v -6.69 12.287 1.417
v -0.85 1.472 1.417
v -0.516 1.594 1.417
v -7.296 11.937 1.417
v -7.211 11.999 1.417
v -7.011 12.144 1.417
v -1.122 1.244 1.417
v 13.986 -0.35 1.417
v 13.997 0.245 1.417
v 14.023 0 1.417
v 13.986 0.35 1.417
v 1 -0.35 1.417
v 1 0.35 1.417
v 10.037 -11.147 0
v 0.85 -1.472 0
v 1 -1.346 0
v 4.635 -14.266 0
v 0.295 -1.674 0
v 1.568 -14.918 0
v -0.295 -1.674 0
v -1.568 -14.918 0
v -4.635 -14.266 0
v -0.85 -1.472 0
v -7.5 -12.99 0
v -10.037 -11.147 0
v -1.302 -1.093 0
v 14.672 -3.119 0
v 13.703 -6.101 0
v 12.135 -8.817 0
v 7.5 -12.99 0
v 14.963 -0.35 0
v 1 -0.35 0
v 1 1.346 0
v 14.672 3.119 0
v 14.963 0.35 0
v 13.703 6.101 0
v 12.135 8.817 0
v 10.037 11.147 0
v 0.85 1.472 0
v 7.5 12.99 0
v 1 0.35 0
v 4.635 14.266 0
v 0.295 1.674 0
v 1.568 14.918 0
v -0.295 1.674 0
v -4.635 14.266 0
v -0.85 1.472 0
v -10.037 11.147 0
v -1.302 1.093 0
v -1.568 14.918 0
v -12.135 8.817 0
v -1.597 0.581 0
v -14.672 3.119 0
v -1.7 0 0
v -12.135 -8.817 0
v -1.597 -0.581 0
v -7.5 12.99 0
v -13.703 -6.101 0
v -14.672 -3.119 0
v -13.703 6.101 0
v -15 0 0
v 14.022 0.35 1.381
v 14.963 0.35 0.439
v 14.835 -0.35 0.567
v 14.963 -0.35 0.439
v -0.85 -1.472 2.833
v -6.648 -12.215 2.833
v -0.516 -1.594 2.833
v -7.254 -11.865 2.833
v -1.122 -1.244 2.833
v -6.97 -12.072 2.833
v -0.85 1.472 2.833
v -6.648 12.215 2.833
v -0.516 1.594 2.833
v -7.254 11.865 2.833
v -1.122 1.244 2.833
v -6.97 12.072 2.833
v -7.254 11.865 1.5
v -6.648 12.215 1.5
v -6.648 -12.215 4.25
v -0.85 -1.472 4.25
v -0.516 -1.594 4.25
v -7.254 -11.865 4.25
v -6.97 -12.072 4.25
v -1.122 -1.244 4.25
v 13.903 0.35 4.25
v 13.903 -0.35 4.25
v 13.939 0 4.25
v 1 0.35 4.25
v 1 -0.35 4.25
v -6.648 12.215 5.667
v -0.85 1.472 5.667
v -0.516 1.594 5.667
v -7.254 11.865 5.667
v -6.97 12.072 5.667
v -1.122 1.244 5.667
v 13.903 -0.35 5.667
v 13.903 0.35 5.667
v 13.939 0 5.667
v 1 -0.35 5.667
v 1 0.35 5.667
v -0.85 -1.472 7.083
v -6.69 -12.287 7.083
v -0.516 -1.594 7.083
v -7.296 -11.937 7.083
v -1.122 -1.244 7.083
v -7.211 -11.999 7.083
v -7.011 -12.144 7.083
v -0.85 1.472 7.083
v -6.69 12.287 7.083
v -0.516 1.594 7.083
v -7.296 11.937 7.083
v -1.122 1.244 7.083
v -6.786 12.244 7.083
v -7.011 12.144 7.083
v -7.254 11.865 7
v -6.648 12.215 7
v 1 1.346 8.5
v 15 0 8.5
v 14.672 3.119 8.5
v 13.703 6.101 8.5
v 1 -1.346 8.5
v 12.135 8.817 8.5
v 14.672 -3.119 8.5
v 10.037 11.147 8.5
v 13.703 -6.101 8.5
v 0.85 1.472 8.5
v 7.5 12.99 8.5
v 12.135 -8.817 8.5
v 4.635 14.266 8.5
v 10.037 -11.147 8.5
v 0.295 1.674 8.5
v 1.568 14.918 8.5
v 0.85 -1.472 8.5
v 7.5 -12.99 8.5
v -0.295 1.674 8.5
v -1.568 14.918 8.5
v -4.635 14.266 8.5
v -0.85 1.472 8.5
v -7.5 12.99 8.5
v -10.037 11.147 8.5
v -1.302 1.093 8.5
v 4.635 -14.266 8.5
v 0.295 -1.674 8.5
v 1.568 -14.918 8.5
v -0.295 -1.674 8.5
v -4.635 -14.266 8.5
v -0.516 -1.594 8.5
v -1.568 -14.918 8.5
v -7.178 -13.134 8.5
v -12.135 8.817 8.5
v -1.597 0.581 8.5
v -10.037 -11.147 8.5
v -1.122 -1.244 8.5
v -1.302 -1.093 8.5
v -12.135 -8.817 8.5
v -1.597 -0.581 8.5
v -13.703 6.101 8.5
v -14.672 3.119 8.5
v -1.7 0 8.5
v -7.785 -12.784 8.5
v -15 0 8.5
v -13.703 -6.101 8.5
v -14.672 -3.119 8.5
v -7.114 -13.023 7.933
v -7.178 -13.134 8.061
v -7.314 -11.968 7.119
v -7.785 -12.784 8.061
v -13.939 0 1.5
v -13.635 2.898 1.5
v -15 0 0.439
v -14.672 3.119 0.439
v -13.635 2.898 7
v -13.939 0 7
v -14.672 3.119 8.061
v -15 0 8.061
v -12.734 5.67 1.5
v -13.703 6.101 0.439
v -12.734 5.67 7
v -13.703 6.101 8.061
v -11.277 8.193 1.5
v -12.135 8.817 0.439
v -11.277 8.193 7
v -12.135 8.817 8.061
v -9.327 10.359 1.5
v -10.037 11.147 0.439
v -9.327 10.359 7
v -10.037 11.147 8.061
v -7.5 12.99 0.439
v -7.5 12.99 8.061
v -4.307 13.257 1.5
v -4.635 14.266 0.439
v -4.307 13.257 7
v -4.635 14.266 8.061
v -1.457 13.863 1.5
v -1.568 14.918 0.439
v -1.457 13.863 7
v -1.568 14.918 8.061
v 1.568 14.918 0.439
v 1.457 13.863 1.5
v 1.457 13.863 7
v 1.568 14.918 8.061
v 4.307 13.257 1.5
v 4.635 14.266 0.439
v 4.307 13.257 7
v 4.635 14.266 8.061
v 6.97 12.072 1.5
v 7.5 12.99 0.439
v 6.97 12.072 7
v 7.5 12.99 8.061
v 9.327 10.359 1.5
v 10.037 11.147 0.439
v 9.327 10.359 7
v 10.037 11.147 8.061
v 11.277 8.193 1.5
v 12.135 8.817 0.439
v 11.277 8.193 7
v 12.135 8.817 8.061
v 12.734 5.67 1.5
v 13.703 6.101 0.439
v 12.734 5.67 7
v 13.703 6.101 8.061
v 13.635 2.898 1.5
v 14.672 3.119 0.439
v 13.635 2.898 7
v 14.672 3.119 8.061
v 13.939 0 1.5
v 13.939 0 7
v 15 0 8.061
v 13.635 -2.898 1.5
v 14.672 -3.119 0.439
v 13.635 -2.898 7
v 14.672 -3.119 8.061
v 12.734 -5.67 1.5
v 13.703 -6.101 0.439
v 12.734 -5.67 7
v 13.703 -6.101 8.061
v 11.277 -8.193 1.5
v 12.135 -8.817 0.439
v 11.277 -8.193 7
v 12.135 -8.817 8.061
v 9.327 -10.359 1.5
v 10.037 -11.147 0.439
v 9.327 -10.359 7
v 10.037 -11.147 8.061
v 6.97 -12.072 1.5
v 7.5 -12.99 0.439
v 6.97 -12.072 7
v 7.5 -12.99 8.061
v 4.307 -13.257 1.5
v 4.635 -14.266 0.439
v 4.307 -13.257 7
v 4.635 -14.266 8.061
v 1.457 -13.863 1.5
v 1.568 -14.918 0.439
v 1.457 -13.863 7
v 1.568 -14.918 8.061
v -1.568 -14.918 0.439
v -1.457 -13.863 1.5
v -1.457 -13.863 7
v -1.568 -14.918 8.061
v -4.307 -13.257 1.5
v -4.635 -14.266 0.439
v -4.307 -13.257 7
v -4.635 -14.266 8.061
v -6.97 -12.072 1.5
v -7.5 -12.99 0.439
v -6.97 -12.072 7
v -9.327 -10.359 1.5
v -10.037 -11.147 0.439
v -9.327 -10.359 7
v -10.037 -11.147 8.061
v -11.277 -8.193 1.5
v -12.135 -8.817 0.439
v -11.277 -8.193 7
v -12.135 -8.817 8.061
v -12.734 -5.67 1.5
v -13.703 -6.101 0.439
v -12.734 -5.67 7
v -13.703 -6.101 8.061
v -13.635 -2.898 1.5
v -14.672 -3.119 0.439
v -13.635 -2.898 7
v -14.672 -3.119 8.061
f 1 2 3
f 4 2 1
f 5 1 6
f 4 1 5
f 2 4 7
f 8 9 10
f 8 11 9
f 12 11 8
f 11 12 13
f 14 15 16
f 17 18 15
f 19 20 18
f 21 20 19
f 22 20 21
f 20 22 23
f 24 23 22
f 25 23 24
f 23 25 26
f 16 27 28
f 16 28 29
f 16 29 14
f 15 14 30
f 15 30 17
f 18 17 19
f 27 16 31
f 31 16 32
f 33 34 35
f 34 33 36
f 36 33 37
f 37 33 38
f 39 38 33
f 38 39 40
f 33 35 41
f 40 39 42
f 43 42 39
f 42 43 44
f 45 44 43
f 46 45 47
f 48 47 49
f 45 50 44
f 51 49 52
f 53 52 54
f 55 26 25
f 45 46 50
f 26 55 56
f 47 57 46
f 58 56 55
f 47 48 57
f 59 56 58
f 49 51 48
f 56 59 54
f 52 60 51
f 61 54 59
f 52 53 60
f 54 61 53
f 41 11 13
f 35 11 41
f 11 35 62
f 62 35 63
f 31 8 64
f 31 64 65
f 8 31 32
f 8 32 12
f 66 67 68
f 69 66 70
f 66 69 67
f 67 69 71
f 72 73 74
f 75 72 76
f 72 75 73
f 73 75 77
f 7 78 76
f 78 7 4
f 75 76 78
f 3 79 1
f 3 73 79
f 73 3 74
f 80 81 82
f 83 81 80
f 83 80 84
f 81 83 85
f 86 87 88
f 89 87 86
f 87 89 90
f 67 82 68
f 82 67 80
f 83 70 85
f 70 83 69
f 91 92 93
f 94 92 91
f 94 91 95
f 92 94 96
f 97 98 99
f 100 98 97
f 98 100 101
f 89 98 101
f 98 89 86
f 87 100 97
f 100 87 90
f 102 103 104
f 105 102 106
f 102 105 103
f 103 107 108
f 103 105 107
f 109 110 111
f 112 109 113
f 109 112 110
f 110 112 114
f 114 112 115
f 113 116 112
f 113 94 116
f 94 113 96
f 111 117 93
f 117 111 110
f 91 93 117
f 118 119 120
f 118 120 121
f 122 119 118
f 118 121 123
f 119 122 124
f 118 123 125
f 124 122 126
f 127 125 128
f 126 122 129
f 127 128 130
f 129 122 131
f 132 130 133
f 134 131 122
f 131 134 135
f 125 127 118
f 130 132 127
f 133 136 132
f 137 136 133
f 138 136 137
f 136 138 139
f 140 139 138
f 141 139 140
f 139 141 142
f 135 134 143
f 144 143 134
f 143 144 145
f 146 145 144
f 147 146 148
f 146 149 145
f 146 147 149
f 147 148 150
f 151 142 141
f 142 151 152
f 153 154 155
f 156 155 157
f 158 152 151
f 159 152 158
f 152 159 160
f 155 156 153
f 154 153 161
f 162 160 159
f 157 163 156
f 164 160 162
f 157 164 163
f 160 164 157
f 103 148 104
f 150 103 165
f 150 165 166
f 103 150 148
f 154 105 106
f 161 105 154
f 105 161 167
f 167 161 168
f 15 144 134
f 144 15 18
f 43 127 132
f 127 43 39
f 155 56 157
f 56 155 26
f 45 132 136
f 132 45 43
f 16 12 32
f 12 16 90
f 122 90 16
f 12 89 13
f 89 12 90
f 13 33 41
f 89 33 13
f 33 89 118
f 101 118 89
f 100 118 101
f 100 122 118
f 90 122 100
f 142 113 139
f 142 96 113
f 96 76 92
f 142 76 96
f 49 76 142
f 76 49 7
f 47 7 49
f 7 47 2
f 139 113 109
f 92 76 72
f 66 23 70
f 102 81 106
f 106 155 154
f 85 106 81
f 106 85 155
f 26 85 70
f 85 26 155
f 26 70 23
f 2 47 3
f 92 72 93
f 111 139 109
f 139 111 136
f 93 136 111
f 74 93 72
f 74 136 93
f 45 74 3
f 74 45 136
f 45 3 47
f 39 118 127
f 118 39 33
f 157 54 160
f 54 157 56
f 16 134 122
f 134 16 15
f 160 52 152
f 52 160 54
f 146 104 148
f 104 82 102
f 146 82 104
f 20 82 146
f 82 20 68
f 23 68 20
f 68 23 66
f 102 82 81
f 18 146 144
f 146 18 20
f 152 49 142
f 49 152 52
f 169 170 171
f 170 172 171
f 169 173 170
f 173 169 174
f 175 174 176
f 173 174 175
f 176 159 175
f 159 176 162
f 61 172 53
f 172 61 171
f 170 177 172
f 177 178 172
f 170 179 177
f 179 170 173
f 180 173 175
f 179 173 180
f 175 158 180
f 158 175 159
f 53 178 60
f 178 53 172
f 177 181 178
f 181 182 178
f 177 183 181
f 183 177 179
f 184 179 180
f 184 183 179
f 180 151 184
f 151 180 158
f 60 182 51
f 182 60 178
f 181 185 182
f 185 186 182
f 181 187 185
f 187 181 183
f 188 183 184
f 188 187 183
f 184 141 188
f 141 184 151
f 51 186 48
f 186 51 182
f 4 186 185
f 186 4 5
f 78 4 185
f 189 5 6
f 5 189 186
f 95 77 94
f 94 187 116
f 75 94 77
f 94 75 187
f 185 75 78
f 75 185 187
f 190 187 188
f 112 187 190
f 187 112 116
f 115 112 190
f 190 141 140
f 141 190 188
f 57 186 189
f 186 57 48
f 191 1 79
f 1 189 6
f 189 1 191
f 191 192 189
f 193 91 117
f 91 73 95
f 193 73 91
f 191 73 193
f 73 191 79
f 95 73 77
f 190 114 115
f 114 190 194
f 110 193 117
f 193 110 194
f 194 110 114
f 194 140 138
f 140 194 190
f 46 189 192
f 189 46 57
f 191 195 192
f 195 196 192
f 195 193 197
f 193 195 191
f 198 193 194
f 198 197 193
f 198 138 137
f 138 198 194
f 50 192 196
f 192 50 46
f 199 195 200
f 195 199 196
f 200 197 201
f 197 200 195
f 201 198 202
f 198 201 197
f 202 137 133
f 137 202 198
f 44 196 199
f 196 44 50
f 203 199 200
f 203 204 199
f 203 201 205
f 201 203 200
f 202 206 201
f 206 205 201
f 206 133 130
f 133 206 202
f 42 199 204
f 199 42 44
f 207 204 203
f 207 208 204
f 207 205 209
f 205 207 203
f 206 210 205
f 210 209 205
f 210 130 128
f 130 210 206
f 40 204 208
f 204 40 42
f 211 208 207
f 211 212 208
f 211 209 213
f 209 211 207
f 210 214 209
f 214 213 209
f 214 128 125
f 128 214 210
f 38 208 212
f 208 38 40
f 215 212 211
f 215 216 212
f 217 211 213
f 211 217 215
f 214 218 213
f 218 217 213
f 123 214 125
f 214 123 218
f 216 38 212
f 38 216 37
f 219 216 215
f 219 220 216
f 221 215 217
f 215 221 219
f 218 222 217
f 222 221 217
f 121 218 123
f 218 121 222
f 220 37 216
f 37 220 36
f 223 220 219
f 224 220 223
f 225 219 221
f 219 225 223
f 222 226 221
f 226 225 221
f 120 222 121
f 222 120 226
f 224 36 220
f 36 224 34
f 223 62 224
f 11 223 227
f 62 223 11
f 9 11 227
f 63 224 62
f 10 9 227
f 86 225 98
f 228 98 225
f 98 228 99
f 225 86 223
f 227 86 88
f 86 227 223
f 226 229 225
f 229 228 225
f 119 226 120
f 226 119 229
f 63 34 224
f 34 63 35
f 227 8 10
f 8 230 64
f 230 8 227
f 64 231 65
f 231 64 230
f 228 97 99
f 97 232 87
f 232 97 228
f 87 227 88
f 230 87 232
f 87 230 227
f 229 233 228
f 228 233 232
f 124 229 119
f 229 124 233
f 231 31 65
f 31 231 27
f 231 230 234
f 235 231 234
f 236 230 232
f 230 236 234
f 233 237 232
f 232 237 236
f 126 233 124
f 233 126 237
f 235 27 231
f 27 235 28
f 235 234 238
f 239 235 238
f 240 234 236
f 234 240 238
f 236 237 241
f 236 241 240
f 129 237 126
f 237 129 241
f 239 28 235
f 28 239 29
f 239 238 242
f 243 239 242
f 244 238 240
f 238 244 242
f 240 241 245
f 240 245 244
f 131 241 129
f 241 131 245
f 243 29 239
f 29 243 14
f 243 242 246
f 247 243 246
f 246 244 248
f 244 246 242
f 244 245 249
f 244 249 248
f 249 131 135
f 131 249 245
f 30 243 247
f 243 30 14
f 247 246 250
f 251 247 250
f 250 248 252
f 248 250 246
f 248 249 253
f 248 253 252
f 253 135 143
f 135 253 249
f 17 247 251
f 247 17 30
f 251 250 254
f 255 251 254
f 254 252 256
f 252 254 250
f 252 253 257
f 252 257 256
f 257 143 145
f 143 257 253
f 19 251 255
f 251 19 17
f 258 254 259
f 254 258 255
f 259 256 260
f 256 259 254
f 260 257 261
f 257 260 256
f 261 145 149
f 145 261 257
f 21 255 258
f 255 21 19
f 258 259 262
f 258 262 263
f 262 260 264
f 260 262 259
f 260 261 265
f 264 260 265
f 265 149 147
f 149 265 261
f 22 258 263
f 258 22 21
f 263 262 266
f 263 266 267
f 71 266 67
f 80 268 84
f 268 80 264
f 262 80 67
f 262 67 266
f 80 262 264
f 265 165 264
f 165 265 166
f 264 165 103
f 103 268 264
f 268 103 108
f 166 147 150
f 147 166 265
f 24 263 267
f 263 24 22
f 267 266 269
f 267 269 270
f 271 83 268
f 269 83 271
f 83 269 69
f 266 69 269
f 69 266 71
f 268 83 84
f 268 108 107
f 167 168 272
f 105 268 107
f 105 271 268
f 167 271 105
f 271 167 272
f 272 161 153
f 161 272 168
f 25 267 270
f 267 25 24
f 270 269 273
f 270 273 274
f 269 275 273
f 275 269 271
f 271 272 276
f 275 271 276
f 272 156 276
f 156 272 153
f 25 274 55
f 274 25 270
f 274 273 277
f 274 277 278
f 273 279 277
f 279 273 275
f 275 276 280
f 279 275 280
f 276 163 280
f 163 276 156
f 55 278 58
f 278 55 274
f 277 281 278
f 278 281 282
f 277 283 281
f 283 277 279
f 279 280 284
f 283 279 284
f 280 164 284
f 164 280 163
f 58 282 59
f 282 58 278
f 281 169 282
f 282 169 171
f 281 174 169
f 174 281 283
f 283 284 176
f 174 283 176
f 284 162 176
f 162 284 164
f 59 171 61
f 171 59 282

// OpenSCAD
// file: inc/bevel_lib.scad
// Bevelled boxes, etc
module roundedbox(size=[1.0, 1.0, 1.0, ], radius = 0.1) {
    hull() {
        for (x = [radius, size[0] - radius]) {
            for (y = [radius, size[1] - radius]) {
                for (z = [radius, size[2] - radius]) {
                    translate([x,y,z])
                        sphere(r=radius);
                }
            }
        }
    }
}

module rounded_square_centered(size=[1,1], radius=0.1) {
    hull() {
        for (x = [- size[0] / 2 + radius, size[0] / 2 - radius]) {
            for (y = [- size[1] / 2 + radius, size[1] / 2 - radius]) {
                translate([x,y]) circle(radius);
            }
        }
    }
}

// Bevelled in x and y axes.
module bevelledbox(size=[1,1,1], radius=0.1) {
    linear_extrude(height=size[2]) {
        // 8-sided polygon
        polygon(points=[
            // Left
            [0, radius ],
            [0, size[1] - radius ],
            // Top
            [radius, size[1]],
            [size[0] - radius, size[1]],
            // Right
            [size[0], size[1] - radius],
            [size[0], radius],
            // Bot
            [size[0] -radius, 0],
            [radius, 0]
            ]);
    }
}

module bevelledbox_y(size=[1,1,1], radius=0.1) {
    // Bevelled around y
    translate([0,0,size[2]])
        rotate(-90, [1,0,0])
            bevelledbox([size[0], size[2], size[1]], radius); 
}

module bevelledbox_x(size=[1,1,1], radius=0.1) {
    // Bevelled around x
    translate([size[0],0,0])
        rotate(-90, [0,1,0])
            bevelledbox([size[2], size[1], size[0]], radius); 
}

// Draw origin-centred, unit polyhedron.
module octahedron(C0=1.0) {
    polyhedron(points = [
        [0.0, 0.0,  C0],
        [0.0, 0.0, -C0],
        [ C0, 0.0, 0.0],
        [-C0, 0.0, 0.0],
        [0.0,  C0, 0.0],
        [0.0, -C0, 0.0]
        ],
        faces = [
[ 4 , 2, 0],
[ 3 , 4, 0],
[ 5 , 3, 0],
[ 2 , 5, 0],
[ 5 , 2, 1],
[ 3 , 5, 1],
[ 4 , 3, 1],
[ 2 , 4, 1]
        ]
    );
}

module fullybevelledbox(size=[1,1,1], radius=0.1) {
    hull() {
        for (x = [radius, size[0] - radius]) {
            for (y = [radius, size[1] - radius]) {
                for (z = [radius, size[2] - radius]) {
                    translate([x,y,z])
                        octahedron(radius);
                }
            }
        }
    }
}
// main file
// This document uses MILLIMETRES as a unit.

// Set $fs (smallest arc fragment) to lower value than default 2.0
$fs = 0.6; // millimetres

use <inc/bevel_lib.scad>;

// Gearbox is approx 15x10 mm, so needs about 18mm inside
main_diameter = 30;

main_radius = main_diameter / 2;

axle_diameter = 3.0;
axle_radius = axle_diameter / 2;
axle_radius_margin = 0.2; // Extra allowance for shrinkage etc
main_height = 8.5;
tyre_radius = 1.5;
tyre_offset = 2.5; // tyre distance from end

// Unit-diamond 
module diamond(r=1.0)
{
    polygon(points=[ [r,0], [0,r], [-r,0], [0,-r] ]);
}

module bevel_square(size=[10,10], r=1.0)
{
    hull() {
        translate([r,r]) diamond(r);
        translate(size - [r,r]) diamond(r);
        translate([size[0] - r, r]) diamond(r);
        translate([r, size[1] - r]) diamond(r);
    }
}

module wheel_vase() 
{
    difference()
    {
        union()
        {
            // Outer part
            rotate_extrude(convexity=3) {
                difference() {
                    
                    union() {
                        // Walls
                            square([main_radius, main_height]);
                    };
                    // Tyre cutout
                    translate([main_radius - (tyre_radius / sqrt(2)),0])
                    {
                        bevel_square([tyre_radius * 2, main_height],
                            r=tyre_radius);
                    }
                }
            }
        }
        
        // Cutouts
        union() 
        {
            // Cutout for axle
            translate([0,0,-10]) {
                linear_extrude(height=30.0, convexity=3) {
                    intersection() {
                        circle(r=axle_radius + axle_radius_margin);
                        flat_width = 0.7; // flat side width
                        translate([- flat_width,0,0]) {
                            side = (axle_radius + axle_radius_margin) * 2;
                            square([side, side], center=true);
                        }
                    }
                } // linear
            } // trans
            // Now we need to cut outs for spokes. These are special;
            // We only put a single spoke on each layer, and rotate around.
            spoke_cut_width = 0.7;
            for (i = [0,1,2,3,4,5]) {
                rotate([0,0,i*120]) 
                    translate([0,-0.5 * spoke_cut_width,i * main_height / 6])
                        cube([main_radius + 10, spoke_cut_width, (main_height / 6) ]);
            }
        } // union
    } // difference
}

wheel_vase();
